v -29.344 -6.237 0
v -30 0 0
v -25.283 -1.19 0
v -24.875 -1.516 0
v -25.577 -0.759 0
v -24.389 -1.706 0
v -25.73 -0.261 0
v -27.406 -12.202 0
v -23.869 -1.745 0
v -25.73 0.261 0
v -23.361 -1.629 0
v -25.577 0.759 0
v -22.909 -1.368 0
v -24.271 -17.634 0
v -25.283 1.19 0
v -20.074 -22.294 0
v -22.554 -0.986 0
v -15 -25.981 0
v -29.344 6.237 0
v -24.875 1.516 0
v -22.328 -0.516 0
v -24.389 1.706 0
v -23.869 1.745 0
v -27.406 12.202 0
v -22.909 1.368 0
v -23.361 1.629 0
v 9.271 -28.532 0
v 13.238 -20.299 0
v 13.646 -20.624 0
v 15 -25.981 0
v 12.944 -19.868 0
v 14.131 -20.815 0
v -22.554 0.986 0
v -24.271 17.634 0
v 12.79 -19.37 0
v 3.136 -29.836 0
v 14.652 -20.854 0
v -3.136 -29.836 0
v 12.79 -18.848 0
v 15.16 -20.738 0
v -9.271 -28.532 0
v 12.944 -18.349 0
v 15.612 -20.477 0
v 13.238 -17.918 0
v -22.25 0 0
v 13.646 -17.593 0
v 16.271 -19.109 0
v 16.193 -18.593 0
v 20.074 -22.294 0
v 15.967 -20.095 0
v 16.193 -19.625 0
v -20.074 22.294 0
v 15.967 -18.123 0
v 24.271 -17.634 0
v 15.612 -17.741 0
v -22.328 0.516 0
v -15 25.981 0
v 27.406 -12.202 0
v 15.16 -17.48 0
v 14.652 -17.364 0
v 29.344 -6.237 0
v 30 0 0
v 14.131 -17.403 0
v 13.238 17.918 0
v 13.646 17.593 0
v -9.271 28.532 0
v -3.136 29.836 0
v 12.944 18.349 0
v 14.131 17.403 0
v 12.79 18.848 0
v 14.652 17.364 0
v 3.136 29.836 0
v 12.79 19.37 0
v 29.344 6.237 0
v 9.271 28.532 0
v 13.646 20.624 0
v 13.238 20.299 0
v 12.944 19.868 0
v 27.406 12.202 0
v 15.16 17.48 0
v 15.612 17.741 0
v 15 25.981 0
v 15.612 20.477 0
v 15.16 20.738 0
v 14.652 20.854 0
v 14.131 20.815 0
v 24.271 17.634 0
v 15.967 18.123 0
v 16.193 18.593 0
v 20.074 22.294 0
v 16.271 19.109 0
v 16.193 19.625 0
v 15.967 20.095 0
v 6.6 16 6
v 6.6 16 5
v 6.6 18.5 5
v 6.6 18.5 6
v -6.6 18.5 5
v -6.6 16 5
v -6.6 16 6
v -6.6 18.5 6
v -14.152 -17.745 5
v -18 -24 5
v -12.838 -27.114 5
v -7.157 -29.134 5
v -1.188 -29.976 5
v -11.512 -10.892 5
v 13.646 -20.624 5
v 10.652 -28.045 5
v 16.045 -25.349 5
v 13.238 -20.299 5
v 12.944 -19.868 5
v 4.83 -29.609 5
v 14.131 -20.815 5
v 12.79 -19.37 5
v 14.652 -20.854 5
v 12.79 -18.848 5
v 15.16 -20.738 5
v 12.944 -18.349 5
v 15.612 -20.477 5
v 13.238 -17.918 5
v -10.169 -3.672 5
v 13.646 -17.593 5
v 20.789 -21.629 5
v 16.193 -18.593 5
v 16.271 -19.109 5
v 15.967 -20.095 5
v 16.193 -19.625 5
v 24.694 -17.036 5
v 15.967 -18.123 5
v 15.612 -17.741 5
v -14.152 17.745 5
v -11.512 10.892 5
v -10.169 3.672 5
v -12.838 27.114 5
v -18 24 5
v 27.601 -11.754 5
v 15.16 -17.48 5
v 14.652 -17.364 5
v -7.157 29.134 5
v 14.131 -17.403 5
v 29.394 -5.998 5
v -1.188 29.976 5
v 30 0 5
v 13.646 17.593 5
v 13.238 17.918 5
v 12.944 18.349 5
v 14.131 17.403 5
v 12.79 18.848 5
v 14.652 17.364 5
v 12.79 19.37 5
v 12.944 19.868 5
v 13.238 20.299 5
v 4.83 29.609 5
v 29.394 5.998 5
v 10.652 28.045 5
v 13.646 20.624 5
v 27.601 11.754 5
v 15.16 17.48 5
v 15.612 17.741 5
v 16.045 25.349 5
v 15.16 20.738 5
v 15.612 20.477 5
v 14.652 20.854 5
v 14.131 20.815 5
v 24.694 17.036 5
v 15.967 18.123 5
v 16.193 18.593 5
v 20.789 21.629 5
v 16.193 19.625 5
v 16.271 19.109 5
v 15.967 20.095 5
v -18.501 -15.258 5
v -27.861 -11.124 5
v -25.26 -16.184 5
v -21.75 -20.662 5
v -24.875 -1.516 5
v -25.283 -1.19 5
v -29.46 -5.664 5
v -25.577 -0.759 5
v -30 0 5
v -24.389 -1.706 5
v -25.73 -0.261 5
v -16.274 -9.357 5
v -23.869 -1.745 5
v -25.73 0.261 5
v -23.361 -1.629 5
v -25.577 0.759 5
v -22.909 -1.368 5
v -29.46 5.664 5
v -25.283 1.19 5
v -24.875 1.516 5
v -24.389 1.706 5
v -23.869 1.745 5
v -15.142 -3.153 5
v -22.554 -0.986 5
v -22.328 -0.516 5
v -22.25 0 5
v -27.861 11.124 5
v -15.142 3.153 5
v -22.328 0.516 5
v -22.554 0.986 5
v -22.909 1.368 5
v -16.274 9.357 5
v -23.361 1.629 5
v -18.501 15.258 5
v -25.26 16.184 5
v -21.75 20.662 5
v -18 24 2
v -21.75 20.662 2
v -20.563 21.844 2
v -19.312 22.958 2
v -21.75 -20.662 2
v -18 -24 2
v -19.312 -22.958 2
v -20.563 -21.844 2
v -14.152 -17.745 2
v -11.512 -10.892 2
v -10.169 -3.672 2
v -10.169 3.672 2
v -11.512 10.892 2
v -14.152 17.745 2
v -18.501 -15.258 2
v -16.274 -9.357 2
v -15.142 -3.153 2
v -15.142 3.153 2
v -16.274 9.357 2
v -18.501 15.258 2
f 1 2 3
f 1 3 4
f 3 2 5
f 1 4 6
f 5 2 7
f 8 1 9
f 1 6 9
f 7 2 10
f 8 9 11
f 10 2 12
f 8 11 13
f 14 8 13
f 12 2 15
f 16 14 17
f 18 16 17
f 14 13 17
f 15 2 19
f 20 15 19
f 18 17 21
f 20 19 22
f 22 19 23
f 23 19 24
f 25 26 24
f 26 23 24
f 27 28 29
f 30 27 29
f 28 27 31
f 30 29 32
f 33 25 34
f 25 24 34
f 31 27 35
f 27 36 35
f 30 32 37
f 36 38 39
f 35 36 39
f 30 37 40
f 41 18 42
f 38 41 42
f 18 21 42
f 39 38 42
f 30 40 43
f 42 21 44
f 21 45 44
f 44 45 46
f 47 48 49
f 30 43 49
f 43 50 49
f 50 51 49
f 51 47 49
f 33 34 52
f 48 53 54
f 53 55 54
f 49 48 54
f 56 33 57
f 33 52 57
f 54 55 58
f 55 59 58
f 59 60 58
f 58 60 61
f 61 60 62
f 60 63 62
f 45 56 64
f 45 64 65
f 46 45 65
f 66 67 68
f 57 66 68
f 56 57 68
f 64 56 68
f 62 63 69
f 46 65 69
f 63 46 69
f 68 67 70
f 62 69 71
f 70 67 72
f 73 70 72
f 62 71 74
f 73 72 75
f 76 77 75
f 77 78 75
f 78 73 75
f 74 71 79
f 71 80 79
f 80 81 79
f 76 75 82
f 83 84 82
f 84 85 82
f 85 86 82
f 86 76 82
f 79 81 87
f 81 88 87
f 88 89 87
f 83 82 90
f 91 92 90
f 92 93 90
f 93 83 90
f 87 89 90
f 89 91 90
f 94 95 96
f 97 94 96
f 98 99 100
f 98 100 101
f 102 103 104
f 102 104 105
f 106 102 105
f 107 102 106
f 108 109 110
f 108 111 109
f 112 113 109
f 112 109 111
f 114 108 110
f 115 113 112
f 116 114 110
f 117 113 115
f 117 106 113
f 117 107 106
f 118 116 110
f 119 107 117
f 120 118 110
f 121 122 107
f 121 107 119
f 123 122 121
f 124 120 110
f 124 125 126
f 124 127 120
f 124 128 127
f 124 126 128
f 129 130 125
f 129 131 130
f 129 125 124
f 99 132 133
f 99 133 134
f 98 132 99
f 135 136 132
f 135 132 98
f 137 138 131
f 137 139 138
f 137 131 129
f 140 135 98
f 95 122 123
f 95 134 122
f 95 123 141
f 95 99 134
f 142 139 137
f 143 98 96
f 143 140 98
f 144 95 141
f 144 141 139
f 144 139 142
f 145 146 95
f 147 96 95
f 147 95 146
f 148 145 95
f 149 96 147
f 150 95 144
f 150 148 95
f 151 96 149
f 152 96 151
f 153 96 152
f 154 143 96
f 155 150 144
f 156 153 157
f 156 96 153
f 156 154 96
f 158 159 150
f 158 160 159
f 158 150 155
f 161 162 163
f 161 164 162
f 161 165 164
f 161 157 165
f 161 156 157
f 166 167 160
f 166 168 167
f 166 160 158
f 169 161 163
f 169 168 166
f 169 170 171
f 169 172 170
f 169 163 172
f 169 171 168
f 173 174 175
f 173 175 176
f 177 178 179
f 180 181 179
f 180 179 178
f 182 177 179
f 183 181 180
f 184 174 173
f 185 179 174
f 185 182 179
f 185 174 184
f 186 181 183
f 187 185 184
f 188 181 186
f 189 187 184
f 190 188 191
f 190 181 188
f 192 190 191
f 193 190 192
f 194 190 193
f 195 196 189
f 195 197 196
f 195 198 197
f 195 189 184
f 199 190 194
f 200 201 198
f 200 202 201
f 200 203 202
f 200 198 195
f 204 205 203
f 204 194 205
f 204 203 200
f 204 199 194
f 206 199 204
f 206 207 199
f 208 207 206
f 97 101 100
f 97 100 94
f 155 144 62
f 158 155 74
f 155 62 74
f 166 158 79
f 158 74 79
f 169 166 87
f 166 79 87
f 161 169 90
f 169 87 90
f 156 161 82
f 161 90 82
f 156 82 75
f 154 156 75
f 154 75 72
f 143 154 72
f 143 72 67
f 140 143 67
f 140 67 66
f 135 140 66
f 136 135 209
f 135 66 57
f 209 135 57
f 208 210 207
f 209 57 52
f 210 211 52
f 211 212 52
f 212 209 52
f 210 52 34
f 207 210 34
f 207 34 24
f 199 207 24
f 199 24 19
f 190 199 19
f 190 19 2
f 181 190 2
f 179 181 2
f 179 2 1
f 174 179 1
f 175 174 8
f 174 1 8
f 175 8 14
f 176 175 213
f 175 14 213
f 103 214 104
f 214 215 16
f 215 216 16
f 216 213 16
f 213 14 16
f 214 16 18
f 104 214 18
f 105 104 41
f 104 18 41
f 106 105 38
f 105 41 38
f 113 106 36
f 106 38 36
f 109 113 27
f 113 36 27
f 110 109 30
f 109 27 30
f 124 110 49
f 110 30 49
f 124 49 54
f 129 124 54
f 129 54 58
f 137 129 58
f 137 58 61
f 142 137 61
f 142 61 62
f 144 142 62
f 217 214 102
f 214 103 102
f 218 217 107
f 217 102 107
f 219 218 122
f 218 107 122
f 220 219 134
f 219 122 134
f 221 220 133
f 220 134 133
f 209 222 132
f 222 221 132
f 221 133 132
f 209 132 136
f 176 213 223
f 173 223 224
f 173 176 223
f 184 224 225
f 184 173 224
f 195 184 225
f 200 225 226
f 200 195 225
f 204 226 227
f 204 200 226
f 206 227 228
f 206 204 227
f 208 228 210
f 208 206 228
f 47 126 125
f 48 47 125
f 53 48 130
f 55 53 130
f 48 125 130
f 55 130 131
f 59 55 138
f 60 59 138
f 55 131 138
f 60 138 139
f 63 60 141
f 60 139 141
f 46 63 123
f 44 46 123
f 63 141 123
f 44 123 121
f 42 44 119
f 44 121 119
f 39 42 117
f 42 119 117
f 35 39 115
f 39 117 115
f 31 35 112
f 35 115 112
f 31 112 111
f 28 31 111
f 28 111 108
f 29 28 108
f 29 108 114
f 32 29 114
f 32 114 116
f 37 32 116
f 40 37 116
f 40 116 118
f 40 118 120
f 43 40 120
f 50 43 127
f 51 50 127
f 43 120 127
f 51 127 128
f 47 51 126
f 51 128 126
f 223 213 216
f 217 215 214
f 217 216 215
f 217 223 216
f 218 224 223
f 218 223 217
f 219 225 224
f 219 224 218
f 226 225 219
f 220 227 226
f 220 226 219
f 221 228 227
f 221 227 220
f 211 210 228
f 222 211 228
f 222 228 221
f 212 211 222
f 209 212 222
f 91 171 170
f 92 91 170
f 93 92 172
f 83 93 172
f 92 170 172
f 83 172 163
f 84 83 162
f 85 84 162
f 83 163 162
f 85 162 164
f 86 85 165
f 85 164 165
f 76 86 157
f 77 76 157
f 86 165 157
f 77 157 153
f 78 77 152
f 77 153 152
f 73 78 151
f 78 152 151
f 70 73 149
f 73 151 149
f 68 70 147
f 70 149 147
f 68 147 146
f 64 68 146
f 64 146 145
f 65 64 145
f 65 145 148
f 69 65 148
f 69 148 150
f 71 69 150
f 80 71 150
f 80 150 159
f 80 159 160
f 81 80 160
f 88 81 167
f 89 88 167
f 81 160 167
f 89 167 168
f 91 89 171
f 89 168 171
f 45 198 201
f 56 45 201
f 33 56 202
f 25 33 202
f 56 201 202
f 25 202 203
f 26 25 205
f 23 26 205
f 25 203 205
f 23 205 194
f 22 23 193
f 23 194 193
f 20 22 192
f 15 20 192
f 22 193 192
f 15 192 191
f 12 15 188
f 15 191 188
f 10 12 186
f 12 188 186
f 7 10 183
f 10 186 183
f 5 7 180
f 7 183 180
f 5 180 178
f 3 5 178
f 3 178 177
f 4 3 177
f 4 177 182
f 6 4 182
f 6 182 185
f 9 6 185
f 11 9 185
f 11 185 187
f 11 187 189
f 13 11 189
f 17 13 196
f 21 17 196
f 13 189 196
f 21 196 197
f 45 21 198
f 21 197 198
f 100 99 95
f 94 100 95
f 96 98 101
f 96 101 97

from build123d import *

# Parameters (mm, degrees)
SKETCH008_R     = 30
PAD004_DEPTH    = 5
SKETCH009_R     = 40
SKETCH009_R_2   = 35
POCKET002_DEPTH = 3
SKETCH015_R     = 1.75
POCKET008_DEPTH = 5
SKETCH038_W     = 13.2
SKETCH038_H     = 2.5
PAD009_DEPTH    = 1


with BuildPart() as part:
    # Sketch008 → Pad004 (new body)
    with BuildSketch(Plane.XY):
        Circle(SKETCH008_R)
    extrude(amount=PAD004_DEPTH)

    # Sketch009 (on Face3 of Pad004) → Pocket002 (cut)
    with BuildSketch(Plane.XY.offset(5)):
        with Locations((-50, 0)):
            Circle(SKETCH009_R)
        with Locations((-50, 0)):
            Circle(SKETCH009_R_2, mode=Mode.SUBTRACT)
    extrude(amount=-POCKET002_DEPTH, mode=Mode.SUBTRACT)

    # Sketch015 (on Face3 of Pocket002) → Pocket008 (cut)
    with BuildSketch(Plane.XY.offset(5)):
        with Locations((-24, 0)):
            Circle(SKETCH015_R)
        with Locations((14.520833, 19.108778)):
            Circle(SKETCH015_R)
        with Locations((14.520833, -19.108778)):
            Circle(SKETCH015_R)
    extrude(amount=-POCKET008_DEPTH, mode=Mode.SUBTRACT)

    # Sketch038 (on Face3 of Pocket008) → Pad009 (join)
    with BuildSketch(Plane.XY.offset(5)):
        with Locations((0, 17.25)):
            Rectangle(SKETCH038_W, SKETCH038_H)
    extrude(amount=PAD009_DEPTH)


solid = part.part
